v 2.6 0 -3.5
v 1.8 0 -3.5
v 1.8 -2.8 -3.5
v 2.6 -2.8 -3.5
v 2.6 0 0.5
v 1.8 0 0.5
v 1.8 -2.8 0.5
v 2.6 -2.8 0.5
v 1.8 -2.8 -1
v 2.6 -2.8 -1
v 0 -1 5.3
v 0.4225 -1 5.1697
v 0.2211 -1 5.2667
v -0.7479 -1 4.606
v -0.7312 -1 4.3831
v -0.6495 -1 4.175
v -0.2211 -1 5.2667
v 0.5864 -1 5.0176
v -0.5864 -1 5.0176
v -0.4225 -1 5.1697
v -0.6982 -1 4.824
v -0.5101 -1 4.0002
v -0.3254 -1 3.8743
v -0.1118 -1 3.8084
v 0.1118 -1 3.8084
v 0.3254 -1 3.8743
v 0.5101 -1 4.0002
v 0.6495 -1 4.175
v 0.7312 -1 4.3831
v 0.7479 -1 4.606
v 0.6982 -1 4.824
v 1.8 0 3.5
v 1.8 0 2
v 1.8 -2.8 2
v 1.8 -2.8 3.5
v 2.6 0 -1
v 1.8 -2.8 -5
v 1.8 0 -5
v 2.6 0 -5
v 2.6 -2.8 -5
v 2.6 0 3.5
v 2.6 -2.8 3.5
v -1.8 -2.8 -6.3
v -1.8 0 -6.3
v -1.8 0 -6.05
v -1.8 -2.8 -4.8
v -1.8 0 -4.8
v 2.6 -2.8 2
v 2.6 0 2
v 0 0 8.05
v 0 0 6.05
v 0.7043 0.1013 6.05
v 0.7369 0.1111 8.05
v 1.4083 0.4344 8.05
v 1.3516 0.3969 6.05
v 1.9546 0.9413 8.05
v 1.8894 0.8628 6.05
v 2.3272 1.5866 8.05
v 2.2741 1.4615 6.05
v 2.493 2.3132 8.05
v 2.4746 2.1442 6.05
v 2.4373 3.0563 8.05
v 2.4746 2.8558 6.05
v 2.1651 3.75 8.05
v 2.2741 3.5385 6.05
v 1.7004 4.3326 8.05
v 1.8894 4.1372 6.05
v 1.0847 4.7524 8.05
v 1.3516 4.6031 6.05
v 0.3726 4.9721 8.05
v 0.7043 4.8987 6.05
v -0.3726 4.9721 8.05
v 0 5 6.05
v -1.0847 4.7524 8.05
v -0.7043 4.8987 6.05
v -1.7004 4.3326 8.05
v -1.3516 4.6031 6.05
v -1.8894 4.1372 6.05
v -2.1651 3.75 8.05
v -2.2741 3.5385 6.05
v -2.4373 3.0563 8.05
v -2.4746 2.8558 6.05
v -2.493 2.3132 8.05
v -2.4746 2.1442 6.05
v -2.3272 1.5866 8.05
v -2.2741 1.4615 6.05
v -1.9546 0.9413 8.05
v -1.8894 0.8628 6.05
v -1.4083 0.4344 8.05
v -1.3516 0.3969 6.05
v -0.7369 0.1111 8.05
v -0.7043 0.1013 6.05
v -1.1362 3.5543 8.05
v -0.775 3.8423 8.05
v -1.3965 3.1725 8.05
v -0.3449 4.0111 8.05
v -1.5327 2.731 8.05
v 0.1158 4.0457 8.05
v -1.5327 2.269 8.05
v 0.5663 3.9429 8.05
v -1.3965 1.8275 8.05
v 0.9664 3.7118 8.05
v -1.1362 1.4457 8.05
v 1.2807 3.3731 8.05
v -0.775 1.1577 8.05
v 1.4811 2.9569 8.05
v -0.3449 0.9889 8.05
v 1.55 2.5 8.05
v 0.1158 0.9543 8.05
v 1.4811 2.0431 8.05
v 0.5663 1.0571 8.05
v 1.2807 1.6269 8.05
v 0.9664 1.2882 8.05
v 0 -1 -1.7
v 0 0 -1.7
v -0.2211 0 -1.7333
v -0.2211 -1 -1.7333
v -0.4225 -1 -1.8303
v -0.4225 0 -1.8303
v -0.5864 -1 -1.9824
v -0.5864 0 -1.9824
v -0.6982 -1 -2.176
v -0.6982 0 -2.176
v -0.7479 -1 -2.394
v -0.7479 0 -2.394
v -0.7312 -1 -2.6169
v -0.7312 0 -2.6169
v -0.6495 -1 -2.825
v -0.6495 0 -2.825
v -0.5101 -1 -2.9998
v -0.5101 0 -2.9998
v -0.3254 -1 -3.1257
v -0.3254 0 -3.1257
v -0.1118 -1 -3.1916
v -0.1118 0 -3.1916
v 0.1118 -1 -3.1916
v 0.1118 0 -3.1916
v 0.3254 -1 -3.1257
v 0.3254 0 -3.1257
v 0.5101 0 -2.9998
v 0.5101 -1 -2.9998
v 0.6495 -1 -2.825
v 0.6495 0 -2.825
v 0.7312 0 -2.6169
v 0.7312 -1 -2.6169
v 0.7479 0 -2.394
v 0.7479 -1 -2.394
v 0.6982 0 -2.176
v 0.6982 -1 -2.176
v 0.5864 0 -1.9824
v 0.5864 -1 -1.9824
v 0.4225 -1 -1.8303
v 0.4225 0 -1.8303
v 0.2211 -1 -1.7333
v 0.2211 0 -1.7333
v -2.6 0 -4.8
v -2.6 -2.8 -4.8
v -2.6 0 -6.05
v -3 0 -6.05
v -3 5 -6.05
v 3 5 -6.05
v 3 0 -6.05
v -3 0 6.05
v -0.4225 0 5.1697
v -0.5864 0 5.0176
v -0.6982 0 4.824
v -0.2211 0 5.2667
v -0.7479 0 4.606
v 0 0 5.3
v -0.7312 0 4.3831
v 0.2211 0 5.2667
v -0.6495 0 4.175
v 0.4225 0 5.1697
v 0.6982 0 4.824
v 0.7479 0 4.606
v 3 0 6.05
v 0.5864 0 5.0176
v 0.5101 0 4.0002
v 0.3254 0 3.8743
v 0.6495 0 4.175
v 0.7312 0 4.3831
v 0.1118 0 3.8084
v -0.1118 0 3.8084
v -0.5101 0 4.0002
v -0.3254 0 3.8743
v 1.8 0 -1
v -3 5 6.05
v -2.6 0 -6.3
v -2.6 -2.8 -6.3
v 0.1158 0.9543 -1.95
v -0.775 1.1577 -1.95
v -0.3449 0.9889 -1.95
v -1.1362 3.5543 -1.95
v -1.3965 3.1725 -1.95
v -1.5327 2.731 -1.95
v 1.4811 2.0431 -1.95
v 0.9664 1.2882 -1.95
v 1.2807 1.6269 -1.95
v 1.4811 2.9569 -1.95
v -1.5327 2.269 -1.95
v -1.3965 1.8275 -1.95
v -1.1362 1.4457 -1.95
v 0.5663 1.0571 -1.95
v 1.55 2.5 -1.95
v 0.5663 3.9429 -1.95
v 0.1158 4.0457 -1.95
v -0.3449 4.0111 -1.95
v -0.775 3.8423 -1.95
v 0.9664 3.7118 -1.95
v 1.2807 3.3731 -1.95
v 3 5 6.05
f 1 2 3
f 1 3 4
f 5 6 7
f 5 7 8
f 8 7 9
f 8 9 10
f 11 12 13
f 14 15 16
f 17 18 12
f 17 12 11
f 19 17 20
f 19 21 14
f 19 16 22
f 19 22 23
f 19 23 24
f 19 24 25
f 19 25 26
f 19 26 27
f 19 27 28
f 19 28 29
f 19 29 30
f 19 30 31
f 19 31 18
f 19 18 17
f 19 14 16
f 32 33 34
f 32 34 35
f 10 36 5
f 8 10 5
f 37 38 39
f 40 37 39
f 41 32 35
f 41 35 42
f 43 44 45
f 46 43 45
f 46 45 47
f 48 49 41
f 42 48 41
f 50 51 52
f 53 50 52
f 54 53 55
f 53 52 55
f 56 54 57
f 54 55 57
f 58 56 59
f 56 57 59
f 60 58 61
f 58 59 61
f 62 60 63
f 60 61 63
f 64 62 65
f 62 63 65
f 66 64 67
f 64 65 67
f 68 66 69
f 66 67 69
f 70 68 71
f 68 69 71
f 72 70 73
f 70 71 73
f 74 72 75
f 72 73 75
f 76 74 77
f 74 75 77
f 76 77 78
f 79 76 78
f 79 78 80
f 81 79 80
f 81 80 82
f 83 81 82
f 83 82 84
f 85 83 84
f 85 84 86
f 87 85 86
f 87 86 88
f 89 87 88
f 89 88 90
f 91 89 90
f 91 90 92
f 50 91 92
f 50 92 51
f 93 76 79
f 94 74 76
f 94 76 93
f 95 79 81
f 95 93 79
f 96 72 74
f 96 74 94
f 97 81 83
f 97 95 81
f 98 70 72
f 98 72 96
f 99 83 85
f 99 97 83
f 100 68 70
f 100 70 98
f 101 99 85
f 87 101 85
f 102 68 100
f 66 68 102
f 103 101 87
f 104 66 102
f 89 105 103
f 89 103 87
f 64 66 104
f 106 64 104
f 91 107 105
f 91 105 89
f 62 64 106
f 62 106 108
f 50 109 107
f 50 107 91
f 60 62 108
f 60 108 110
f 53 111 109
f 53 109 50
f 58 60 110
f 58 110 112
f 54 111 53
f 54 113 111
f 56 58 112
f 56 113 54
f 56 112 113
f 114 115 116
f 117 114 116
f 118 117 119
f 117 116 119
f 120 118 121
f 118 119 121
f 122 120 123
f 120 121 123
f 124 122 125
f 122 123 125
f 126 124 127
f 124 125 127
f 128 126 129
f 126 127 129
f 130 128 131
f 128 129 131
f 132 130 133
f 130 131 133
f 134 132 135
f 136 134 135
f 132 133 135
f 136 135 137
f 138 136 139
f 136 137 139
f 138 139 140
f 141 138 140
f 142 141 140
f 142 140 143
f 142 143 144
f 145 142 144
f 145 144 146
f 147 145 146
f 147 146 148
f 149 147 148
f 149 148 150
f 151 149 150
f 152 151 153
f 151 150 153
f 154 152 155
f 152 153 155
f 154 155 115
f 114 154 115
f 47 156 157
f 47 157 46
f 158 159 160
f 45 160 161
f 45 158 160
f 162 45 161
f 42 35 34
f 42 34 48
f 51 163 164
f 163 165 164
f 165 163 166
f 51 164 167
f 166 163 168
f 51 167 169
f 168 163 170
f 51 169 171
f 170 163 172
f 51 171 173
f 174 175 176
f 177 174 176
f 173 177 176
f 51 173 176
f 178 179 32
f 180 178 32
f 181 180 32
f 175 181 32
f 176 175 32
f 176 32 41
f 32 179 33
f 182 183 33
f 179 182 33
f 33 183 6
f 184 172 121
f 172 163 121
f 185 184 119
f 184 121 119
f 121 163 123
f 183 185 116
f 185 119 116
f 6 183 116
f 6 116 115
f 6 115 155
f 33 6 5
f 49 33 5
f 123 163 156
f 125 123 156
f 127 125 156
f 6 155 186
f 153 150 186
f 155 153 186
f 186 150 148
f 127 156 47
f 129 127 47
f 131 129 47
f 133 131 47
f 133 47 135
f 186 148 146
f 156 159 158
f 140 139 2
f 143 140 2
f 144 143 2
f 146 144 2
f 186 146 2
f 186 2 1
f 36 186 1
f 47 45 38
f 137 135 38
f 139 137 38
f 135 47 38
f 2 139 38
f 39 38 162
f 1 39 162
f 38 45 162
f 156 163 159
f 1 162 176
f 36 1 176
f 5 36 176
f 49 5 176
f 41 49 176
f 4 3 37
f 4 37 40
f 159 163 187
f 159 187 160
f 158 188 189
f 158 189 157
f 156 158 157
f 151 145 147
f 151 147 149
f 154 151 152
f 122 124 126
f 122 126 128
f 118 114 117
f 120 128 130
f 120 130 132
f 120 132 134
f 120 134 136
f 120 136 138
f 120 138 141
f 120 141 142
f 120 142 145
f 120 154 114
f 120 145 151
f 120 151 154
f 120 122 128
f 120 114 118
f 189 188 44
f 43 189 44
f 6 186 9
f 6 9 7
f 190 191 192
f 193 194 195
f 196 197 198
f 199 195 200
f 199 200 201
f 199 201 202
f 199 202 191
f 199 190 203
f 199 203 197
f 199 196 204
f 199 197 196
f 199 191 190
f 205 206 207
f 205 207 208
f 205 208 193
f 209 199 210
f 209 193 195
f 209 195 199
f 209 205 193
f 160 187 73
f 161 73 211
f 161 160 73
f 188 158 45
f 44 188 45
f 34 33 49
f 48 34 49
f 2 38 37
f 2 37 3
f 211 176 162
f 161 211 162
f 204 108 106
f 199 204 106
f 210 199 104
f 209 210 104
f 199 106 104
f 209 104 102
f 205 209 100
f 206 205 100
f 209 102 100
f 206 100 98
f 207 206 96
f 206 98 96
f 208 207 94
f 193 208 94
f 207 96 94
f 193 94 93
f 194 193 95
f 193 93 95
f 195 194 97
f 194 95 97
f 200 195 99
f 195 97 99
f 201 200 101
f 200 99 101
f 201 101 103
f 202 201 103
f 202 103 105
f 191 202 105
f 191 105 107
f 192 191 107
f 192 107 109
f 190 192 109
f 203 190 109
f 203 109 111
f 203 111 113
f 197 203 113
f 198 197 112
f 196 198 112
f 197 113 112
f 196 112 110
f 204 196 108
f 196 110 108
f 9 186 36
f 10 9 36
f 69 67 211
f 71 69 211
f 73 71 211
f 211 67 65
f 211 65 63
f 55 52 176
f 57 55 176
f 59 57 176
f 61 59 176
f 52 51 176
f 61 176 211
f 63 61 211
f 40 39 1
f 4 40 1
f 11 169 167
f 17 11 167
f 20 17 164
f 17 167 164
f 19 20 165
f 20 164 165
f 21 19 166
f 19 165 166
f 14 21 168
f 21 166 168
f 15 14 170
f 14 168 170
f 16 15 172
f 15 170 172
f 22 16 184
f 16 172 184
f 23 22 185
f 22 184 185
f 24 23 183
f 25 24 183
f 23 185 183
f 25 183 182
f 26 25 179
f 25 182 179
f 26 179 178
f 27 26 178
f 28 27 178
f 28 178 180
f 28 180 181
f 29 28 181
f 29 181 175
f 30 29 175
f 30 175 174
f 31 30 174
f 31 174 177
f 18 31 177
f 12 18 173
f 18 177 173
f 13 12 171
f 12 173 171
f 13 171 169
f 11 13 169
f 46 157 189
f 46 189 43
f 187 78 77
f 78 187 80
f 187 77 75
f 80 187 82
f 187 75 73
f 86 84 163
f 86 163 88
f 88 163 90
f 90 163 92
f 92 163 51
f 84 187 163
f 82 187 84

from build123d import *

# Parameters (mm, degrees)
SKETCH1_W           = 6
SKETCH1_H           = 12.1
BOSS_EXTRUDE1_DEPTH = 5
SKETCH2_R           = 2.5
BOSS_EXTRUDE2_DEPTH = 2
SKETCH4_W           = 0.8
SKETCH4_H           = 1.5
BOSS_EXTRUDE3_DEPTH = 2.8
SKETCH5_R           = 0.75
BOSS_EXTRUDE4_DEPTH = 1
SKETCH6_R           = 1.55
CUT_EXTRUDE1_DEPTH  = 10


with BuildPart() as part:
    # Sketch1 → Boss-Extrude1 (new body)
    with BuildSketch(Plane(origin=(0, 0, 0), x_dir=(1, 0, 0), z_dir=(0, 1, 0))):
        Rectangle(SKETCH1_W, SKETCH1_H)
    extrude(amount=BOSS_EXTRUDE1_DEPTH)

    # Sketch2 → Boss-Extrude2 (add)
    with BuildSketch(Plane.XY.offset(6.05)):
        with Locations(Location((0, 2.5, 0), (0, 0, 270))):
            Circle(SKETCH2_R)
    extrude(amount=BOSS_EXTRUDE2_DEPTH)

    # Sketch4 → Boss-Extrude3 (add)
    with BuildSketch(Plane.XZ):
        with Locations((2.2, 2.75)):
            Rectangle(SKETCH4_W, SKETCH4_H)
        with Locations((2.2, -0.25)):
            Rectangle(SKETCH4_W, SKETCH4_H)
        with Locations((2.2, -4.25)):
            Rectangle(SKETCH4_W, SKETCH4_H)
        with Locations((-2.2, -5.55)):
            Rectangle(SKETCH4_W, SKETCH4_H)
    extrude(amount=BOSS_EXTRUDE3_DEPTH)

    # Sketch5 → Boss-Extrude4 (add)
    with BuildSketch(Plane.XZ):
        with Locations(Location((0, 4.55, 0), (0, 0, 90))):
            Circle(SKETCH5_R)
        with Locations(Location((0, -2.45, 0), (0, 0, 90))):
            Circle(SKETCH5_R)
    extrude(amount=BOSS_EXTRUDE4_DEPTH)

    # Sketch6 → Cut-Extrude1 (cut)
    with BuildSketch(Plane.XY.offset(8.05)):
        with Locations((0, 2.5)):
            Circle(SKETCH6_R)
    extrude(amount=-CUT_EXTRUDE1_DEPTH, mode=Mode.SUBTRACT)


solid = part.part
